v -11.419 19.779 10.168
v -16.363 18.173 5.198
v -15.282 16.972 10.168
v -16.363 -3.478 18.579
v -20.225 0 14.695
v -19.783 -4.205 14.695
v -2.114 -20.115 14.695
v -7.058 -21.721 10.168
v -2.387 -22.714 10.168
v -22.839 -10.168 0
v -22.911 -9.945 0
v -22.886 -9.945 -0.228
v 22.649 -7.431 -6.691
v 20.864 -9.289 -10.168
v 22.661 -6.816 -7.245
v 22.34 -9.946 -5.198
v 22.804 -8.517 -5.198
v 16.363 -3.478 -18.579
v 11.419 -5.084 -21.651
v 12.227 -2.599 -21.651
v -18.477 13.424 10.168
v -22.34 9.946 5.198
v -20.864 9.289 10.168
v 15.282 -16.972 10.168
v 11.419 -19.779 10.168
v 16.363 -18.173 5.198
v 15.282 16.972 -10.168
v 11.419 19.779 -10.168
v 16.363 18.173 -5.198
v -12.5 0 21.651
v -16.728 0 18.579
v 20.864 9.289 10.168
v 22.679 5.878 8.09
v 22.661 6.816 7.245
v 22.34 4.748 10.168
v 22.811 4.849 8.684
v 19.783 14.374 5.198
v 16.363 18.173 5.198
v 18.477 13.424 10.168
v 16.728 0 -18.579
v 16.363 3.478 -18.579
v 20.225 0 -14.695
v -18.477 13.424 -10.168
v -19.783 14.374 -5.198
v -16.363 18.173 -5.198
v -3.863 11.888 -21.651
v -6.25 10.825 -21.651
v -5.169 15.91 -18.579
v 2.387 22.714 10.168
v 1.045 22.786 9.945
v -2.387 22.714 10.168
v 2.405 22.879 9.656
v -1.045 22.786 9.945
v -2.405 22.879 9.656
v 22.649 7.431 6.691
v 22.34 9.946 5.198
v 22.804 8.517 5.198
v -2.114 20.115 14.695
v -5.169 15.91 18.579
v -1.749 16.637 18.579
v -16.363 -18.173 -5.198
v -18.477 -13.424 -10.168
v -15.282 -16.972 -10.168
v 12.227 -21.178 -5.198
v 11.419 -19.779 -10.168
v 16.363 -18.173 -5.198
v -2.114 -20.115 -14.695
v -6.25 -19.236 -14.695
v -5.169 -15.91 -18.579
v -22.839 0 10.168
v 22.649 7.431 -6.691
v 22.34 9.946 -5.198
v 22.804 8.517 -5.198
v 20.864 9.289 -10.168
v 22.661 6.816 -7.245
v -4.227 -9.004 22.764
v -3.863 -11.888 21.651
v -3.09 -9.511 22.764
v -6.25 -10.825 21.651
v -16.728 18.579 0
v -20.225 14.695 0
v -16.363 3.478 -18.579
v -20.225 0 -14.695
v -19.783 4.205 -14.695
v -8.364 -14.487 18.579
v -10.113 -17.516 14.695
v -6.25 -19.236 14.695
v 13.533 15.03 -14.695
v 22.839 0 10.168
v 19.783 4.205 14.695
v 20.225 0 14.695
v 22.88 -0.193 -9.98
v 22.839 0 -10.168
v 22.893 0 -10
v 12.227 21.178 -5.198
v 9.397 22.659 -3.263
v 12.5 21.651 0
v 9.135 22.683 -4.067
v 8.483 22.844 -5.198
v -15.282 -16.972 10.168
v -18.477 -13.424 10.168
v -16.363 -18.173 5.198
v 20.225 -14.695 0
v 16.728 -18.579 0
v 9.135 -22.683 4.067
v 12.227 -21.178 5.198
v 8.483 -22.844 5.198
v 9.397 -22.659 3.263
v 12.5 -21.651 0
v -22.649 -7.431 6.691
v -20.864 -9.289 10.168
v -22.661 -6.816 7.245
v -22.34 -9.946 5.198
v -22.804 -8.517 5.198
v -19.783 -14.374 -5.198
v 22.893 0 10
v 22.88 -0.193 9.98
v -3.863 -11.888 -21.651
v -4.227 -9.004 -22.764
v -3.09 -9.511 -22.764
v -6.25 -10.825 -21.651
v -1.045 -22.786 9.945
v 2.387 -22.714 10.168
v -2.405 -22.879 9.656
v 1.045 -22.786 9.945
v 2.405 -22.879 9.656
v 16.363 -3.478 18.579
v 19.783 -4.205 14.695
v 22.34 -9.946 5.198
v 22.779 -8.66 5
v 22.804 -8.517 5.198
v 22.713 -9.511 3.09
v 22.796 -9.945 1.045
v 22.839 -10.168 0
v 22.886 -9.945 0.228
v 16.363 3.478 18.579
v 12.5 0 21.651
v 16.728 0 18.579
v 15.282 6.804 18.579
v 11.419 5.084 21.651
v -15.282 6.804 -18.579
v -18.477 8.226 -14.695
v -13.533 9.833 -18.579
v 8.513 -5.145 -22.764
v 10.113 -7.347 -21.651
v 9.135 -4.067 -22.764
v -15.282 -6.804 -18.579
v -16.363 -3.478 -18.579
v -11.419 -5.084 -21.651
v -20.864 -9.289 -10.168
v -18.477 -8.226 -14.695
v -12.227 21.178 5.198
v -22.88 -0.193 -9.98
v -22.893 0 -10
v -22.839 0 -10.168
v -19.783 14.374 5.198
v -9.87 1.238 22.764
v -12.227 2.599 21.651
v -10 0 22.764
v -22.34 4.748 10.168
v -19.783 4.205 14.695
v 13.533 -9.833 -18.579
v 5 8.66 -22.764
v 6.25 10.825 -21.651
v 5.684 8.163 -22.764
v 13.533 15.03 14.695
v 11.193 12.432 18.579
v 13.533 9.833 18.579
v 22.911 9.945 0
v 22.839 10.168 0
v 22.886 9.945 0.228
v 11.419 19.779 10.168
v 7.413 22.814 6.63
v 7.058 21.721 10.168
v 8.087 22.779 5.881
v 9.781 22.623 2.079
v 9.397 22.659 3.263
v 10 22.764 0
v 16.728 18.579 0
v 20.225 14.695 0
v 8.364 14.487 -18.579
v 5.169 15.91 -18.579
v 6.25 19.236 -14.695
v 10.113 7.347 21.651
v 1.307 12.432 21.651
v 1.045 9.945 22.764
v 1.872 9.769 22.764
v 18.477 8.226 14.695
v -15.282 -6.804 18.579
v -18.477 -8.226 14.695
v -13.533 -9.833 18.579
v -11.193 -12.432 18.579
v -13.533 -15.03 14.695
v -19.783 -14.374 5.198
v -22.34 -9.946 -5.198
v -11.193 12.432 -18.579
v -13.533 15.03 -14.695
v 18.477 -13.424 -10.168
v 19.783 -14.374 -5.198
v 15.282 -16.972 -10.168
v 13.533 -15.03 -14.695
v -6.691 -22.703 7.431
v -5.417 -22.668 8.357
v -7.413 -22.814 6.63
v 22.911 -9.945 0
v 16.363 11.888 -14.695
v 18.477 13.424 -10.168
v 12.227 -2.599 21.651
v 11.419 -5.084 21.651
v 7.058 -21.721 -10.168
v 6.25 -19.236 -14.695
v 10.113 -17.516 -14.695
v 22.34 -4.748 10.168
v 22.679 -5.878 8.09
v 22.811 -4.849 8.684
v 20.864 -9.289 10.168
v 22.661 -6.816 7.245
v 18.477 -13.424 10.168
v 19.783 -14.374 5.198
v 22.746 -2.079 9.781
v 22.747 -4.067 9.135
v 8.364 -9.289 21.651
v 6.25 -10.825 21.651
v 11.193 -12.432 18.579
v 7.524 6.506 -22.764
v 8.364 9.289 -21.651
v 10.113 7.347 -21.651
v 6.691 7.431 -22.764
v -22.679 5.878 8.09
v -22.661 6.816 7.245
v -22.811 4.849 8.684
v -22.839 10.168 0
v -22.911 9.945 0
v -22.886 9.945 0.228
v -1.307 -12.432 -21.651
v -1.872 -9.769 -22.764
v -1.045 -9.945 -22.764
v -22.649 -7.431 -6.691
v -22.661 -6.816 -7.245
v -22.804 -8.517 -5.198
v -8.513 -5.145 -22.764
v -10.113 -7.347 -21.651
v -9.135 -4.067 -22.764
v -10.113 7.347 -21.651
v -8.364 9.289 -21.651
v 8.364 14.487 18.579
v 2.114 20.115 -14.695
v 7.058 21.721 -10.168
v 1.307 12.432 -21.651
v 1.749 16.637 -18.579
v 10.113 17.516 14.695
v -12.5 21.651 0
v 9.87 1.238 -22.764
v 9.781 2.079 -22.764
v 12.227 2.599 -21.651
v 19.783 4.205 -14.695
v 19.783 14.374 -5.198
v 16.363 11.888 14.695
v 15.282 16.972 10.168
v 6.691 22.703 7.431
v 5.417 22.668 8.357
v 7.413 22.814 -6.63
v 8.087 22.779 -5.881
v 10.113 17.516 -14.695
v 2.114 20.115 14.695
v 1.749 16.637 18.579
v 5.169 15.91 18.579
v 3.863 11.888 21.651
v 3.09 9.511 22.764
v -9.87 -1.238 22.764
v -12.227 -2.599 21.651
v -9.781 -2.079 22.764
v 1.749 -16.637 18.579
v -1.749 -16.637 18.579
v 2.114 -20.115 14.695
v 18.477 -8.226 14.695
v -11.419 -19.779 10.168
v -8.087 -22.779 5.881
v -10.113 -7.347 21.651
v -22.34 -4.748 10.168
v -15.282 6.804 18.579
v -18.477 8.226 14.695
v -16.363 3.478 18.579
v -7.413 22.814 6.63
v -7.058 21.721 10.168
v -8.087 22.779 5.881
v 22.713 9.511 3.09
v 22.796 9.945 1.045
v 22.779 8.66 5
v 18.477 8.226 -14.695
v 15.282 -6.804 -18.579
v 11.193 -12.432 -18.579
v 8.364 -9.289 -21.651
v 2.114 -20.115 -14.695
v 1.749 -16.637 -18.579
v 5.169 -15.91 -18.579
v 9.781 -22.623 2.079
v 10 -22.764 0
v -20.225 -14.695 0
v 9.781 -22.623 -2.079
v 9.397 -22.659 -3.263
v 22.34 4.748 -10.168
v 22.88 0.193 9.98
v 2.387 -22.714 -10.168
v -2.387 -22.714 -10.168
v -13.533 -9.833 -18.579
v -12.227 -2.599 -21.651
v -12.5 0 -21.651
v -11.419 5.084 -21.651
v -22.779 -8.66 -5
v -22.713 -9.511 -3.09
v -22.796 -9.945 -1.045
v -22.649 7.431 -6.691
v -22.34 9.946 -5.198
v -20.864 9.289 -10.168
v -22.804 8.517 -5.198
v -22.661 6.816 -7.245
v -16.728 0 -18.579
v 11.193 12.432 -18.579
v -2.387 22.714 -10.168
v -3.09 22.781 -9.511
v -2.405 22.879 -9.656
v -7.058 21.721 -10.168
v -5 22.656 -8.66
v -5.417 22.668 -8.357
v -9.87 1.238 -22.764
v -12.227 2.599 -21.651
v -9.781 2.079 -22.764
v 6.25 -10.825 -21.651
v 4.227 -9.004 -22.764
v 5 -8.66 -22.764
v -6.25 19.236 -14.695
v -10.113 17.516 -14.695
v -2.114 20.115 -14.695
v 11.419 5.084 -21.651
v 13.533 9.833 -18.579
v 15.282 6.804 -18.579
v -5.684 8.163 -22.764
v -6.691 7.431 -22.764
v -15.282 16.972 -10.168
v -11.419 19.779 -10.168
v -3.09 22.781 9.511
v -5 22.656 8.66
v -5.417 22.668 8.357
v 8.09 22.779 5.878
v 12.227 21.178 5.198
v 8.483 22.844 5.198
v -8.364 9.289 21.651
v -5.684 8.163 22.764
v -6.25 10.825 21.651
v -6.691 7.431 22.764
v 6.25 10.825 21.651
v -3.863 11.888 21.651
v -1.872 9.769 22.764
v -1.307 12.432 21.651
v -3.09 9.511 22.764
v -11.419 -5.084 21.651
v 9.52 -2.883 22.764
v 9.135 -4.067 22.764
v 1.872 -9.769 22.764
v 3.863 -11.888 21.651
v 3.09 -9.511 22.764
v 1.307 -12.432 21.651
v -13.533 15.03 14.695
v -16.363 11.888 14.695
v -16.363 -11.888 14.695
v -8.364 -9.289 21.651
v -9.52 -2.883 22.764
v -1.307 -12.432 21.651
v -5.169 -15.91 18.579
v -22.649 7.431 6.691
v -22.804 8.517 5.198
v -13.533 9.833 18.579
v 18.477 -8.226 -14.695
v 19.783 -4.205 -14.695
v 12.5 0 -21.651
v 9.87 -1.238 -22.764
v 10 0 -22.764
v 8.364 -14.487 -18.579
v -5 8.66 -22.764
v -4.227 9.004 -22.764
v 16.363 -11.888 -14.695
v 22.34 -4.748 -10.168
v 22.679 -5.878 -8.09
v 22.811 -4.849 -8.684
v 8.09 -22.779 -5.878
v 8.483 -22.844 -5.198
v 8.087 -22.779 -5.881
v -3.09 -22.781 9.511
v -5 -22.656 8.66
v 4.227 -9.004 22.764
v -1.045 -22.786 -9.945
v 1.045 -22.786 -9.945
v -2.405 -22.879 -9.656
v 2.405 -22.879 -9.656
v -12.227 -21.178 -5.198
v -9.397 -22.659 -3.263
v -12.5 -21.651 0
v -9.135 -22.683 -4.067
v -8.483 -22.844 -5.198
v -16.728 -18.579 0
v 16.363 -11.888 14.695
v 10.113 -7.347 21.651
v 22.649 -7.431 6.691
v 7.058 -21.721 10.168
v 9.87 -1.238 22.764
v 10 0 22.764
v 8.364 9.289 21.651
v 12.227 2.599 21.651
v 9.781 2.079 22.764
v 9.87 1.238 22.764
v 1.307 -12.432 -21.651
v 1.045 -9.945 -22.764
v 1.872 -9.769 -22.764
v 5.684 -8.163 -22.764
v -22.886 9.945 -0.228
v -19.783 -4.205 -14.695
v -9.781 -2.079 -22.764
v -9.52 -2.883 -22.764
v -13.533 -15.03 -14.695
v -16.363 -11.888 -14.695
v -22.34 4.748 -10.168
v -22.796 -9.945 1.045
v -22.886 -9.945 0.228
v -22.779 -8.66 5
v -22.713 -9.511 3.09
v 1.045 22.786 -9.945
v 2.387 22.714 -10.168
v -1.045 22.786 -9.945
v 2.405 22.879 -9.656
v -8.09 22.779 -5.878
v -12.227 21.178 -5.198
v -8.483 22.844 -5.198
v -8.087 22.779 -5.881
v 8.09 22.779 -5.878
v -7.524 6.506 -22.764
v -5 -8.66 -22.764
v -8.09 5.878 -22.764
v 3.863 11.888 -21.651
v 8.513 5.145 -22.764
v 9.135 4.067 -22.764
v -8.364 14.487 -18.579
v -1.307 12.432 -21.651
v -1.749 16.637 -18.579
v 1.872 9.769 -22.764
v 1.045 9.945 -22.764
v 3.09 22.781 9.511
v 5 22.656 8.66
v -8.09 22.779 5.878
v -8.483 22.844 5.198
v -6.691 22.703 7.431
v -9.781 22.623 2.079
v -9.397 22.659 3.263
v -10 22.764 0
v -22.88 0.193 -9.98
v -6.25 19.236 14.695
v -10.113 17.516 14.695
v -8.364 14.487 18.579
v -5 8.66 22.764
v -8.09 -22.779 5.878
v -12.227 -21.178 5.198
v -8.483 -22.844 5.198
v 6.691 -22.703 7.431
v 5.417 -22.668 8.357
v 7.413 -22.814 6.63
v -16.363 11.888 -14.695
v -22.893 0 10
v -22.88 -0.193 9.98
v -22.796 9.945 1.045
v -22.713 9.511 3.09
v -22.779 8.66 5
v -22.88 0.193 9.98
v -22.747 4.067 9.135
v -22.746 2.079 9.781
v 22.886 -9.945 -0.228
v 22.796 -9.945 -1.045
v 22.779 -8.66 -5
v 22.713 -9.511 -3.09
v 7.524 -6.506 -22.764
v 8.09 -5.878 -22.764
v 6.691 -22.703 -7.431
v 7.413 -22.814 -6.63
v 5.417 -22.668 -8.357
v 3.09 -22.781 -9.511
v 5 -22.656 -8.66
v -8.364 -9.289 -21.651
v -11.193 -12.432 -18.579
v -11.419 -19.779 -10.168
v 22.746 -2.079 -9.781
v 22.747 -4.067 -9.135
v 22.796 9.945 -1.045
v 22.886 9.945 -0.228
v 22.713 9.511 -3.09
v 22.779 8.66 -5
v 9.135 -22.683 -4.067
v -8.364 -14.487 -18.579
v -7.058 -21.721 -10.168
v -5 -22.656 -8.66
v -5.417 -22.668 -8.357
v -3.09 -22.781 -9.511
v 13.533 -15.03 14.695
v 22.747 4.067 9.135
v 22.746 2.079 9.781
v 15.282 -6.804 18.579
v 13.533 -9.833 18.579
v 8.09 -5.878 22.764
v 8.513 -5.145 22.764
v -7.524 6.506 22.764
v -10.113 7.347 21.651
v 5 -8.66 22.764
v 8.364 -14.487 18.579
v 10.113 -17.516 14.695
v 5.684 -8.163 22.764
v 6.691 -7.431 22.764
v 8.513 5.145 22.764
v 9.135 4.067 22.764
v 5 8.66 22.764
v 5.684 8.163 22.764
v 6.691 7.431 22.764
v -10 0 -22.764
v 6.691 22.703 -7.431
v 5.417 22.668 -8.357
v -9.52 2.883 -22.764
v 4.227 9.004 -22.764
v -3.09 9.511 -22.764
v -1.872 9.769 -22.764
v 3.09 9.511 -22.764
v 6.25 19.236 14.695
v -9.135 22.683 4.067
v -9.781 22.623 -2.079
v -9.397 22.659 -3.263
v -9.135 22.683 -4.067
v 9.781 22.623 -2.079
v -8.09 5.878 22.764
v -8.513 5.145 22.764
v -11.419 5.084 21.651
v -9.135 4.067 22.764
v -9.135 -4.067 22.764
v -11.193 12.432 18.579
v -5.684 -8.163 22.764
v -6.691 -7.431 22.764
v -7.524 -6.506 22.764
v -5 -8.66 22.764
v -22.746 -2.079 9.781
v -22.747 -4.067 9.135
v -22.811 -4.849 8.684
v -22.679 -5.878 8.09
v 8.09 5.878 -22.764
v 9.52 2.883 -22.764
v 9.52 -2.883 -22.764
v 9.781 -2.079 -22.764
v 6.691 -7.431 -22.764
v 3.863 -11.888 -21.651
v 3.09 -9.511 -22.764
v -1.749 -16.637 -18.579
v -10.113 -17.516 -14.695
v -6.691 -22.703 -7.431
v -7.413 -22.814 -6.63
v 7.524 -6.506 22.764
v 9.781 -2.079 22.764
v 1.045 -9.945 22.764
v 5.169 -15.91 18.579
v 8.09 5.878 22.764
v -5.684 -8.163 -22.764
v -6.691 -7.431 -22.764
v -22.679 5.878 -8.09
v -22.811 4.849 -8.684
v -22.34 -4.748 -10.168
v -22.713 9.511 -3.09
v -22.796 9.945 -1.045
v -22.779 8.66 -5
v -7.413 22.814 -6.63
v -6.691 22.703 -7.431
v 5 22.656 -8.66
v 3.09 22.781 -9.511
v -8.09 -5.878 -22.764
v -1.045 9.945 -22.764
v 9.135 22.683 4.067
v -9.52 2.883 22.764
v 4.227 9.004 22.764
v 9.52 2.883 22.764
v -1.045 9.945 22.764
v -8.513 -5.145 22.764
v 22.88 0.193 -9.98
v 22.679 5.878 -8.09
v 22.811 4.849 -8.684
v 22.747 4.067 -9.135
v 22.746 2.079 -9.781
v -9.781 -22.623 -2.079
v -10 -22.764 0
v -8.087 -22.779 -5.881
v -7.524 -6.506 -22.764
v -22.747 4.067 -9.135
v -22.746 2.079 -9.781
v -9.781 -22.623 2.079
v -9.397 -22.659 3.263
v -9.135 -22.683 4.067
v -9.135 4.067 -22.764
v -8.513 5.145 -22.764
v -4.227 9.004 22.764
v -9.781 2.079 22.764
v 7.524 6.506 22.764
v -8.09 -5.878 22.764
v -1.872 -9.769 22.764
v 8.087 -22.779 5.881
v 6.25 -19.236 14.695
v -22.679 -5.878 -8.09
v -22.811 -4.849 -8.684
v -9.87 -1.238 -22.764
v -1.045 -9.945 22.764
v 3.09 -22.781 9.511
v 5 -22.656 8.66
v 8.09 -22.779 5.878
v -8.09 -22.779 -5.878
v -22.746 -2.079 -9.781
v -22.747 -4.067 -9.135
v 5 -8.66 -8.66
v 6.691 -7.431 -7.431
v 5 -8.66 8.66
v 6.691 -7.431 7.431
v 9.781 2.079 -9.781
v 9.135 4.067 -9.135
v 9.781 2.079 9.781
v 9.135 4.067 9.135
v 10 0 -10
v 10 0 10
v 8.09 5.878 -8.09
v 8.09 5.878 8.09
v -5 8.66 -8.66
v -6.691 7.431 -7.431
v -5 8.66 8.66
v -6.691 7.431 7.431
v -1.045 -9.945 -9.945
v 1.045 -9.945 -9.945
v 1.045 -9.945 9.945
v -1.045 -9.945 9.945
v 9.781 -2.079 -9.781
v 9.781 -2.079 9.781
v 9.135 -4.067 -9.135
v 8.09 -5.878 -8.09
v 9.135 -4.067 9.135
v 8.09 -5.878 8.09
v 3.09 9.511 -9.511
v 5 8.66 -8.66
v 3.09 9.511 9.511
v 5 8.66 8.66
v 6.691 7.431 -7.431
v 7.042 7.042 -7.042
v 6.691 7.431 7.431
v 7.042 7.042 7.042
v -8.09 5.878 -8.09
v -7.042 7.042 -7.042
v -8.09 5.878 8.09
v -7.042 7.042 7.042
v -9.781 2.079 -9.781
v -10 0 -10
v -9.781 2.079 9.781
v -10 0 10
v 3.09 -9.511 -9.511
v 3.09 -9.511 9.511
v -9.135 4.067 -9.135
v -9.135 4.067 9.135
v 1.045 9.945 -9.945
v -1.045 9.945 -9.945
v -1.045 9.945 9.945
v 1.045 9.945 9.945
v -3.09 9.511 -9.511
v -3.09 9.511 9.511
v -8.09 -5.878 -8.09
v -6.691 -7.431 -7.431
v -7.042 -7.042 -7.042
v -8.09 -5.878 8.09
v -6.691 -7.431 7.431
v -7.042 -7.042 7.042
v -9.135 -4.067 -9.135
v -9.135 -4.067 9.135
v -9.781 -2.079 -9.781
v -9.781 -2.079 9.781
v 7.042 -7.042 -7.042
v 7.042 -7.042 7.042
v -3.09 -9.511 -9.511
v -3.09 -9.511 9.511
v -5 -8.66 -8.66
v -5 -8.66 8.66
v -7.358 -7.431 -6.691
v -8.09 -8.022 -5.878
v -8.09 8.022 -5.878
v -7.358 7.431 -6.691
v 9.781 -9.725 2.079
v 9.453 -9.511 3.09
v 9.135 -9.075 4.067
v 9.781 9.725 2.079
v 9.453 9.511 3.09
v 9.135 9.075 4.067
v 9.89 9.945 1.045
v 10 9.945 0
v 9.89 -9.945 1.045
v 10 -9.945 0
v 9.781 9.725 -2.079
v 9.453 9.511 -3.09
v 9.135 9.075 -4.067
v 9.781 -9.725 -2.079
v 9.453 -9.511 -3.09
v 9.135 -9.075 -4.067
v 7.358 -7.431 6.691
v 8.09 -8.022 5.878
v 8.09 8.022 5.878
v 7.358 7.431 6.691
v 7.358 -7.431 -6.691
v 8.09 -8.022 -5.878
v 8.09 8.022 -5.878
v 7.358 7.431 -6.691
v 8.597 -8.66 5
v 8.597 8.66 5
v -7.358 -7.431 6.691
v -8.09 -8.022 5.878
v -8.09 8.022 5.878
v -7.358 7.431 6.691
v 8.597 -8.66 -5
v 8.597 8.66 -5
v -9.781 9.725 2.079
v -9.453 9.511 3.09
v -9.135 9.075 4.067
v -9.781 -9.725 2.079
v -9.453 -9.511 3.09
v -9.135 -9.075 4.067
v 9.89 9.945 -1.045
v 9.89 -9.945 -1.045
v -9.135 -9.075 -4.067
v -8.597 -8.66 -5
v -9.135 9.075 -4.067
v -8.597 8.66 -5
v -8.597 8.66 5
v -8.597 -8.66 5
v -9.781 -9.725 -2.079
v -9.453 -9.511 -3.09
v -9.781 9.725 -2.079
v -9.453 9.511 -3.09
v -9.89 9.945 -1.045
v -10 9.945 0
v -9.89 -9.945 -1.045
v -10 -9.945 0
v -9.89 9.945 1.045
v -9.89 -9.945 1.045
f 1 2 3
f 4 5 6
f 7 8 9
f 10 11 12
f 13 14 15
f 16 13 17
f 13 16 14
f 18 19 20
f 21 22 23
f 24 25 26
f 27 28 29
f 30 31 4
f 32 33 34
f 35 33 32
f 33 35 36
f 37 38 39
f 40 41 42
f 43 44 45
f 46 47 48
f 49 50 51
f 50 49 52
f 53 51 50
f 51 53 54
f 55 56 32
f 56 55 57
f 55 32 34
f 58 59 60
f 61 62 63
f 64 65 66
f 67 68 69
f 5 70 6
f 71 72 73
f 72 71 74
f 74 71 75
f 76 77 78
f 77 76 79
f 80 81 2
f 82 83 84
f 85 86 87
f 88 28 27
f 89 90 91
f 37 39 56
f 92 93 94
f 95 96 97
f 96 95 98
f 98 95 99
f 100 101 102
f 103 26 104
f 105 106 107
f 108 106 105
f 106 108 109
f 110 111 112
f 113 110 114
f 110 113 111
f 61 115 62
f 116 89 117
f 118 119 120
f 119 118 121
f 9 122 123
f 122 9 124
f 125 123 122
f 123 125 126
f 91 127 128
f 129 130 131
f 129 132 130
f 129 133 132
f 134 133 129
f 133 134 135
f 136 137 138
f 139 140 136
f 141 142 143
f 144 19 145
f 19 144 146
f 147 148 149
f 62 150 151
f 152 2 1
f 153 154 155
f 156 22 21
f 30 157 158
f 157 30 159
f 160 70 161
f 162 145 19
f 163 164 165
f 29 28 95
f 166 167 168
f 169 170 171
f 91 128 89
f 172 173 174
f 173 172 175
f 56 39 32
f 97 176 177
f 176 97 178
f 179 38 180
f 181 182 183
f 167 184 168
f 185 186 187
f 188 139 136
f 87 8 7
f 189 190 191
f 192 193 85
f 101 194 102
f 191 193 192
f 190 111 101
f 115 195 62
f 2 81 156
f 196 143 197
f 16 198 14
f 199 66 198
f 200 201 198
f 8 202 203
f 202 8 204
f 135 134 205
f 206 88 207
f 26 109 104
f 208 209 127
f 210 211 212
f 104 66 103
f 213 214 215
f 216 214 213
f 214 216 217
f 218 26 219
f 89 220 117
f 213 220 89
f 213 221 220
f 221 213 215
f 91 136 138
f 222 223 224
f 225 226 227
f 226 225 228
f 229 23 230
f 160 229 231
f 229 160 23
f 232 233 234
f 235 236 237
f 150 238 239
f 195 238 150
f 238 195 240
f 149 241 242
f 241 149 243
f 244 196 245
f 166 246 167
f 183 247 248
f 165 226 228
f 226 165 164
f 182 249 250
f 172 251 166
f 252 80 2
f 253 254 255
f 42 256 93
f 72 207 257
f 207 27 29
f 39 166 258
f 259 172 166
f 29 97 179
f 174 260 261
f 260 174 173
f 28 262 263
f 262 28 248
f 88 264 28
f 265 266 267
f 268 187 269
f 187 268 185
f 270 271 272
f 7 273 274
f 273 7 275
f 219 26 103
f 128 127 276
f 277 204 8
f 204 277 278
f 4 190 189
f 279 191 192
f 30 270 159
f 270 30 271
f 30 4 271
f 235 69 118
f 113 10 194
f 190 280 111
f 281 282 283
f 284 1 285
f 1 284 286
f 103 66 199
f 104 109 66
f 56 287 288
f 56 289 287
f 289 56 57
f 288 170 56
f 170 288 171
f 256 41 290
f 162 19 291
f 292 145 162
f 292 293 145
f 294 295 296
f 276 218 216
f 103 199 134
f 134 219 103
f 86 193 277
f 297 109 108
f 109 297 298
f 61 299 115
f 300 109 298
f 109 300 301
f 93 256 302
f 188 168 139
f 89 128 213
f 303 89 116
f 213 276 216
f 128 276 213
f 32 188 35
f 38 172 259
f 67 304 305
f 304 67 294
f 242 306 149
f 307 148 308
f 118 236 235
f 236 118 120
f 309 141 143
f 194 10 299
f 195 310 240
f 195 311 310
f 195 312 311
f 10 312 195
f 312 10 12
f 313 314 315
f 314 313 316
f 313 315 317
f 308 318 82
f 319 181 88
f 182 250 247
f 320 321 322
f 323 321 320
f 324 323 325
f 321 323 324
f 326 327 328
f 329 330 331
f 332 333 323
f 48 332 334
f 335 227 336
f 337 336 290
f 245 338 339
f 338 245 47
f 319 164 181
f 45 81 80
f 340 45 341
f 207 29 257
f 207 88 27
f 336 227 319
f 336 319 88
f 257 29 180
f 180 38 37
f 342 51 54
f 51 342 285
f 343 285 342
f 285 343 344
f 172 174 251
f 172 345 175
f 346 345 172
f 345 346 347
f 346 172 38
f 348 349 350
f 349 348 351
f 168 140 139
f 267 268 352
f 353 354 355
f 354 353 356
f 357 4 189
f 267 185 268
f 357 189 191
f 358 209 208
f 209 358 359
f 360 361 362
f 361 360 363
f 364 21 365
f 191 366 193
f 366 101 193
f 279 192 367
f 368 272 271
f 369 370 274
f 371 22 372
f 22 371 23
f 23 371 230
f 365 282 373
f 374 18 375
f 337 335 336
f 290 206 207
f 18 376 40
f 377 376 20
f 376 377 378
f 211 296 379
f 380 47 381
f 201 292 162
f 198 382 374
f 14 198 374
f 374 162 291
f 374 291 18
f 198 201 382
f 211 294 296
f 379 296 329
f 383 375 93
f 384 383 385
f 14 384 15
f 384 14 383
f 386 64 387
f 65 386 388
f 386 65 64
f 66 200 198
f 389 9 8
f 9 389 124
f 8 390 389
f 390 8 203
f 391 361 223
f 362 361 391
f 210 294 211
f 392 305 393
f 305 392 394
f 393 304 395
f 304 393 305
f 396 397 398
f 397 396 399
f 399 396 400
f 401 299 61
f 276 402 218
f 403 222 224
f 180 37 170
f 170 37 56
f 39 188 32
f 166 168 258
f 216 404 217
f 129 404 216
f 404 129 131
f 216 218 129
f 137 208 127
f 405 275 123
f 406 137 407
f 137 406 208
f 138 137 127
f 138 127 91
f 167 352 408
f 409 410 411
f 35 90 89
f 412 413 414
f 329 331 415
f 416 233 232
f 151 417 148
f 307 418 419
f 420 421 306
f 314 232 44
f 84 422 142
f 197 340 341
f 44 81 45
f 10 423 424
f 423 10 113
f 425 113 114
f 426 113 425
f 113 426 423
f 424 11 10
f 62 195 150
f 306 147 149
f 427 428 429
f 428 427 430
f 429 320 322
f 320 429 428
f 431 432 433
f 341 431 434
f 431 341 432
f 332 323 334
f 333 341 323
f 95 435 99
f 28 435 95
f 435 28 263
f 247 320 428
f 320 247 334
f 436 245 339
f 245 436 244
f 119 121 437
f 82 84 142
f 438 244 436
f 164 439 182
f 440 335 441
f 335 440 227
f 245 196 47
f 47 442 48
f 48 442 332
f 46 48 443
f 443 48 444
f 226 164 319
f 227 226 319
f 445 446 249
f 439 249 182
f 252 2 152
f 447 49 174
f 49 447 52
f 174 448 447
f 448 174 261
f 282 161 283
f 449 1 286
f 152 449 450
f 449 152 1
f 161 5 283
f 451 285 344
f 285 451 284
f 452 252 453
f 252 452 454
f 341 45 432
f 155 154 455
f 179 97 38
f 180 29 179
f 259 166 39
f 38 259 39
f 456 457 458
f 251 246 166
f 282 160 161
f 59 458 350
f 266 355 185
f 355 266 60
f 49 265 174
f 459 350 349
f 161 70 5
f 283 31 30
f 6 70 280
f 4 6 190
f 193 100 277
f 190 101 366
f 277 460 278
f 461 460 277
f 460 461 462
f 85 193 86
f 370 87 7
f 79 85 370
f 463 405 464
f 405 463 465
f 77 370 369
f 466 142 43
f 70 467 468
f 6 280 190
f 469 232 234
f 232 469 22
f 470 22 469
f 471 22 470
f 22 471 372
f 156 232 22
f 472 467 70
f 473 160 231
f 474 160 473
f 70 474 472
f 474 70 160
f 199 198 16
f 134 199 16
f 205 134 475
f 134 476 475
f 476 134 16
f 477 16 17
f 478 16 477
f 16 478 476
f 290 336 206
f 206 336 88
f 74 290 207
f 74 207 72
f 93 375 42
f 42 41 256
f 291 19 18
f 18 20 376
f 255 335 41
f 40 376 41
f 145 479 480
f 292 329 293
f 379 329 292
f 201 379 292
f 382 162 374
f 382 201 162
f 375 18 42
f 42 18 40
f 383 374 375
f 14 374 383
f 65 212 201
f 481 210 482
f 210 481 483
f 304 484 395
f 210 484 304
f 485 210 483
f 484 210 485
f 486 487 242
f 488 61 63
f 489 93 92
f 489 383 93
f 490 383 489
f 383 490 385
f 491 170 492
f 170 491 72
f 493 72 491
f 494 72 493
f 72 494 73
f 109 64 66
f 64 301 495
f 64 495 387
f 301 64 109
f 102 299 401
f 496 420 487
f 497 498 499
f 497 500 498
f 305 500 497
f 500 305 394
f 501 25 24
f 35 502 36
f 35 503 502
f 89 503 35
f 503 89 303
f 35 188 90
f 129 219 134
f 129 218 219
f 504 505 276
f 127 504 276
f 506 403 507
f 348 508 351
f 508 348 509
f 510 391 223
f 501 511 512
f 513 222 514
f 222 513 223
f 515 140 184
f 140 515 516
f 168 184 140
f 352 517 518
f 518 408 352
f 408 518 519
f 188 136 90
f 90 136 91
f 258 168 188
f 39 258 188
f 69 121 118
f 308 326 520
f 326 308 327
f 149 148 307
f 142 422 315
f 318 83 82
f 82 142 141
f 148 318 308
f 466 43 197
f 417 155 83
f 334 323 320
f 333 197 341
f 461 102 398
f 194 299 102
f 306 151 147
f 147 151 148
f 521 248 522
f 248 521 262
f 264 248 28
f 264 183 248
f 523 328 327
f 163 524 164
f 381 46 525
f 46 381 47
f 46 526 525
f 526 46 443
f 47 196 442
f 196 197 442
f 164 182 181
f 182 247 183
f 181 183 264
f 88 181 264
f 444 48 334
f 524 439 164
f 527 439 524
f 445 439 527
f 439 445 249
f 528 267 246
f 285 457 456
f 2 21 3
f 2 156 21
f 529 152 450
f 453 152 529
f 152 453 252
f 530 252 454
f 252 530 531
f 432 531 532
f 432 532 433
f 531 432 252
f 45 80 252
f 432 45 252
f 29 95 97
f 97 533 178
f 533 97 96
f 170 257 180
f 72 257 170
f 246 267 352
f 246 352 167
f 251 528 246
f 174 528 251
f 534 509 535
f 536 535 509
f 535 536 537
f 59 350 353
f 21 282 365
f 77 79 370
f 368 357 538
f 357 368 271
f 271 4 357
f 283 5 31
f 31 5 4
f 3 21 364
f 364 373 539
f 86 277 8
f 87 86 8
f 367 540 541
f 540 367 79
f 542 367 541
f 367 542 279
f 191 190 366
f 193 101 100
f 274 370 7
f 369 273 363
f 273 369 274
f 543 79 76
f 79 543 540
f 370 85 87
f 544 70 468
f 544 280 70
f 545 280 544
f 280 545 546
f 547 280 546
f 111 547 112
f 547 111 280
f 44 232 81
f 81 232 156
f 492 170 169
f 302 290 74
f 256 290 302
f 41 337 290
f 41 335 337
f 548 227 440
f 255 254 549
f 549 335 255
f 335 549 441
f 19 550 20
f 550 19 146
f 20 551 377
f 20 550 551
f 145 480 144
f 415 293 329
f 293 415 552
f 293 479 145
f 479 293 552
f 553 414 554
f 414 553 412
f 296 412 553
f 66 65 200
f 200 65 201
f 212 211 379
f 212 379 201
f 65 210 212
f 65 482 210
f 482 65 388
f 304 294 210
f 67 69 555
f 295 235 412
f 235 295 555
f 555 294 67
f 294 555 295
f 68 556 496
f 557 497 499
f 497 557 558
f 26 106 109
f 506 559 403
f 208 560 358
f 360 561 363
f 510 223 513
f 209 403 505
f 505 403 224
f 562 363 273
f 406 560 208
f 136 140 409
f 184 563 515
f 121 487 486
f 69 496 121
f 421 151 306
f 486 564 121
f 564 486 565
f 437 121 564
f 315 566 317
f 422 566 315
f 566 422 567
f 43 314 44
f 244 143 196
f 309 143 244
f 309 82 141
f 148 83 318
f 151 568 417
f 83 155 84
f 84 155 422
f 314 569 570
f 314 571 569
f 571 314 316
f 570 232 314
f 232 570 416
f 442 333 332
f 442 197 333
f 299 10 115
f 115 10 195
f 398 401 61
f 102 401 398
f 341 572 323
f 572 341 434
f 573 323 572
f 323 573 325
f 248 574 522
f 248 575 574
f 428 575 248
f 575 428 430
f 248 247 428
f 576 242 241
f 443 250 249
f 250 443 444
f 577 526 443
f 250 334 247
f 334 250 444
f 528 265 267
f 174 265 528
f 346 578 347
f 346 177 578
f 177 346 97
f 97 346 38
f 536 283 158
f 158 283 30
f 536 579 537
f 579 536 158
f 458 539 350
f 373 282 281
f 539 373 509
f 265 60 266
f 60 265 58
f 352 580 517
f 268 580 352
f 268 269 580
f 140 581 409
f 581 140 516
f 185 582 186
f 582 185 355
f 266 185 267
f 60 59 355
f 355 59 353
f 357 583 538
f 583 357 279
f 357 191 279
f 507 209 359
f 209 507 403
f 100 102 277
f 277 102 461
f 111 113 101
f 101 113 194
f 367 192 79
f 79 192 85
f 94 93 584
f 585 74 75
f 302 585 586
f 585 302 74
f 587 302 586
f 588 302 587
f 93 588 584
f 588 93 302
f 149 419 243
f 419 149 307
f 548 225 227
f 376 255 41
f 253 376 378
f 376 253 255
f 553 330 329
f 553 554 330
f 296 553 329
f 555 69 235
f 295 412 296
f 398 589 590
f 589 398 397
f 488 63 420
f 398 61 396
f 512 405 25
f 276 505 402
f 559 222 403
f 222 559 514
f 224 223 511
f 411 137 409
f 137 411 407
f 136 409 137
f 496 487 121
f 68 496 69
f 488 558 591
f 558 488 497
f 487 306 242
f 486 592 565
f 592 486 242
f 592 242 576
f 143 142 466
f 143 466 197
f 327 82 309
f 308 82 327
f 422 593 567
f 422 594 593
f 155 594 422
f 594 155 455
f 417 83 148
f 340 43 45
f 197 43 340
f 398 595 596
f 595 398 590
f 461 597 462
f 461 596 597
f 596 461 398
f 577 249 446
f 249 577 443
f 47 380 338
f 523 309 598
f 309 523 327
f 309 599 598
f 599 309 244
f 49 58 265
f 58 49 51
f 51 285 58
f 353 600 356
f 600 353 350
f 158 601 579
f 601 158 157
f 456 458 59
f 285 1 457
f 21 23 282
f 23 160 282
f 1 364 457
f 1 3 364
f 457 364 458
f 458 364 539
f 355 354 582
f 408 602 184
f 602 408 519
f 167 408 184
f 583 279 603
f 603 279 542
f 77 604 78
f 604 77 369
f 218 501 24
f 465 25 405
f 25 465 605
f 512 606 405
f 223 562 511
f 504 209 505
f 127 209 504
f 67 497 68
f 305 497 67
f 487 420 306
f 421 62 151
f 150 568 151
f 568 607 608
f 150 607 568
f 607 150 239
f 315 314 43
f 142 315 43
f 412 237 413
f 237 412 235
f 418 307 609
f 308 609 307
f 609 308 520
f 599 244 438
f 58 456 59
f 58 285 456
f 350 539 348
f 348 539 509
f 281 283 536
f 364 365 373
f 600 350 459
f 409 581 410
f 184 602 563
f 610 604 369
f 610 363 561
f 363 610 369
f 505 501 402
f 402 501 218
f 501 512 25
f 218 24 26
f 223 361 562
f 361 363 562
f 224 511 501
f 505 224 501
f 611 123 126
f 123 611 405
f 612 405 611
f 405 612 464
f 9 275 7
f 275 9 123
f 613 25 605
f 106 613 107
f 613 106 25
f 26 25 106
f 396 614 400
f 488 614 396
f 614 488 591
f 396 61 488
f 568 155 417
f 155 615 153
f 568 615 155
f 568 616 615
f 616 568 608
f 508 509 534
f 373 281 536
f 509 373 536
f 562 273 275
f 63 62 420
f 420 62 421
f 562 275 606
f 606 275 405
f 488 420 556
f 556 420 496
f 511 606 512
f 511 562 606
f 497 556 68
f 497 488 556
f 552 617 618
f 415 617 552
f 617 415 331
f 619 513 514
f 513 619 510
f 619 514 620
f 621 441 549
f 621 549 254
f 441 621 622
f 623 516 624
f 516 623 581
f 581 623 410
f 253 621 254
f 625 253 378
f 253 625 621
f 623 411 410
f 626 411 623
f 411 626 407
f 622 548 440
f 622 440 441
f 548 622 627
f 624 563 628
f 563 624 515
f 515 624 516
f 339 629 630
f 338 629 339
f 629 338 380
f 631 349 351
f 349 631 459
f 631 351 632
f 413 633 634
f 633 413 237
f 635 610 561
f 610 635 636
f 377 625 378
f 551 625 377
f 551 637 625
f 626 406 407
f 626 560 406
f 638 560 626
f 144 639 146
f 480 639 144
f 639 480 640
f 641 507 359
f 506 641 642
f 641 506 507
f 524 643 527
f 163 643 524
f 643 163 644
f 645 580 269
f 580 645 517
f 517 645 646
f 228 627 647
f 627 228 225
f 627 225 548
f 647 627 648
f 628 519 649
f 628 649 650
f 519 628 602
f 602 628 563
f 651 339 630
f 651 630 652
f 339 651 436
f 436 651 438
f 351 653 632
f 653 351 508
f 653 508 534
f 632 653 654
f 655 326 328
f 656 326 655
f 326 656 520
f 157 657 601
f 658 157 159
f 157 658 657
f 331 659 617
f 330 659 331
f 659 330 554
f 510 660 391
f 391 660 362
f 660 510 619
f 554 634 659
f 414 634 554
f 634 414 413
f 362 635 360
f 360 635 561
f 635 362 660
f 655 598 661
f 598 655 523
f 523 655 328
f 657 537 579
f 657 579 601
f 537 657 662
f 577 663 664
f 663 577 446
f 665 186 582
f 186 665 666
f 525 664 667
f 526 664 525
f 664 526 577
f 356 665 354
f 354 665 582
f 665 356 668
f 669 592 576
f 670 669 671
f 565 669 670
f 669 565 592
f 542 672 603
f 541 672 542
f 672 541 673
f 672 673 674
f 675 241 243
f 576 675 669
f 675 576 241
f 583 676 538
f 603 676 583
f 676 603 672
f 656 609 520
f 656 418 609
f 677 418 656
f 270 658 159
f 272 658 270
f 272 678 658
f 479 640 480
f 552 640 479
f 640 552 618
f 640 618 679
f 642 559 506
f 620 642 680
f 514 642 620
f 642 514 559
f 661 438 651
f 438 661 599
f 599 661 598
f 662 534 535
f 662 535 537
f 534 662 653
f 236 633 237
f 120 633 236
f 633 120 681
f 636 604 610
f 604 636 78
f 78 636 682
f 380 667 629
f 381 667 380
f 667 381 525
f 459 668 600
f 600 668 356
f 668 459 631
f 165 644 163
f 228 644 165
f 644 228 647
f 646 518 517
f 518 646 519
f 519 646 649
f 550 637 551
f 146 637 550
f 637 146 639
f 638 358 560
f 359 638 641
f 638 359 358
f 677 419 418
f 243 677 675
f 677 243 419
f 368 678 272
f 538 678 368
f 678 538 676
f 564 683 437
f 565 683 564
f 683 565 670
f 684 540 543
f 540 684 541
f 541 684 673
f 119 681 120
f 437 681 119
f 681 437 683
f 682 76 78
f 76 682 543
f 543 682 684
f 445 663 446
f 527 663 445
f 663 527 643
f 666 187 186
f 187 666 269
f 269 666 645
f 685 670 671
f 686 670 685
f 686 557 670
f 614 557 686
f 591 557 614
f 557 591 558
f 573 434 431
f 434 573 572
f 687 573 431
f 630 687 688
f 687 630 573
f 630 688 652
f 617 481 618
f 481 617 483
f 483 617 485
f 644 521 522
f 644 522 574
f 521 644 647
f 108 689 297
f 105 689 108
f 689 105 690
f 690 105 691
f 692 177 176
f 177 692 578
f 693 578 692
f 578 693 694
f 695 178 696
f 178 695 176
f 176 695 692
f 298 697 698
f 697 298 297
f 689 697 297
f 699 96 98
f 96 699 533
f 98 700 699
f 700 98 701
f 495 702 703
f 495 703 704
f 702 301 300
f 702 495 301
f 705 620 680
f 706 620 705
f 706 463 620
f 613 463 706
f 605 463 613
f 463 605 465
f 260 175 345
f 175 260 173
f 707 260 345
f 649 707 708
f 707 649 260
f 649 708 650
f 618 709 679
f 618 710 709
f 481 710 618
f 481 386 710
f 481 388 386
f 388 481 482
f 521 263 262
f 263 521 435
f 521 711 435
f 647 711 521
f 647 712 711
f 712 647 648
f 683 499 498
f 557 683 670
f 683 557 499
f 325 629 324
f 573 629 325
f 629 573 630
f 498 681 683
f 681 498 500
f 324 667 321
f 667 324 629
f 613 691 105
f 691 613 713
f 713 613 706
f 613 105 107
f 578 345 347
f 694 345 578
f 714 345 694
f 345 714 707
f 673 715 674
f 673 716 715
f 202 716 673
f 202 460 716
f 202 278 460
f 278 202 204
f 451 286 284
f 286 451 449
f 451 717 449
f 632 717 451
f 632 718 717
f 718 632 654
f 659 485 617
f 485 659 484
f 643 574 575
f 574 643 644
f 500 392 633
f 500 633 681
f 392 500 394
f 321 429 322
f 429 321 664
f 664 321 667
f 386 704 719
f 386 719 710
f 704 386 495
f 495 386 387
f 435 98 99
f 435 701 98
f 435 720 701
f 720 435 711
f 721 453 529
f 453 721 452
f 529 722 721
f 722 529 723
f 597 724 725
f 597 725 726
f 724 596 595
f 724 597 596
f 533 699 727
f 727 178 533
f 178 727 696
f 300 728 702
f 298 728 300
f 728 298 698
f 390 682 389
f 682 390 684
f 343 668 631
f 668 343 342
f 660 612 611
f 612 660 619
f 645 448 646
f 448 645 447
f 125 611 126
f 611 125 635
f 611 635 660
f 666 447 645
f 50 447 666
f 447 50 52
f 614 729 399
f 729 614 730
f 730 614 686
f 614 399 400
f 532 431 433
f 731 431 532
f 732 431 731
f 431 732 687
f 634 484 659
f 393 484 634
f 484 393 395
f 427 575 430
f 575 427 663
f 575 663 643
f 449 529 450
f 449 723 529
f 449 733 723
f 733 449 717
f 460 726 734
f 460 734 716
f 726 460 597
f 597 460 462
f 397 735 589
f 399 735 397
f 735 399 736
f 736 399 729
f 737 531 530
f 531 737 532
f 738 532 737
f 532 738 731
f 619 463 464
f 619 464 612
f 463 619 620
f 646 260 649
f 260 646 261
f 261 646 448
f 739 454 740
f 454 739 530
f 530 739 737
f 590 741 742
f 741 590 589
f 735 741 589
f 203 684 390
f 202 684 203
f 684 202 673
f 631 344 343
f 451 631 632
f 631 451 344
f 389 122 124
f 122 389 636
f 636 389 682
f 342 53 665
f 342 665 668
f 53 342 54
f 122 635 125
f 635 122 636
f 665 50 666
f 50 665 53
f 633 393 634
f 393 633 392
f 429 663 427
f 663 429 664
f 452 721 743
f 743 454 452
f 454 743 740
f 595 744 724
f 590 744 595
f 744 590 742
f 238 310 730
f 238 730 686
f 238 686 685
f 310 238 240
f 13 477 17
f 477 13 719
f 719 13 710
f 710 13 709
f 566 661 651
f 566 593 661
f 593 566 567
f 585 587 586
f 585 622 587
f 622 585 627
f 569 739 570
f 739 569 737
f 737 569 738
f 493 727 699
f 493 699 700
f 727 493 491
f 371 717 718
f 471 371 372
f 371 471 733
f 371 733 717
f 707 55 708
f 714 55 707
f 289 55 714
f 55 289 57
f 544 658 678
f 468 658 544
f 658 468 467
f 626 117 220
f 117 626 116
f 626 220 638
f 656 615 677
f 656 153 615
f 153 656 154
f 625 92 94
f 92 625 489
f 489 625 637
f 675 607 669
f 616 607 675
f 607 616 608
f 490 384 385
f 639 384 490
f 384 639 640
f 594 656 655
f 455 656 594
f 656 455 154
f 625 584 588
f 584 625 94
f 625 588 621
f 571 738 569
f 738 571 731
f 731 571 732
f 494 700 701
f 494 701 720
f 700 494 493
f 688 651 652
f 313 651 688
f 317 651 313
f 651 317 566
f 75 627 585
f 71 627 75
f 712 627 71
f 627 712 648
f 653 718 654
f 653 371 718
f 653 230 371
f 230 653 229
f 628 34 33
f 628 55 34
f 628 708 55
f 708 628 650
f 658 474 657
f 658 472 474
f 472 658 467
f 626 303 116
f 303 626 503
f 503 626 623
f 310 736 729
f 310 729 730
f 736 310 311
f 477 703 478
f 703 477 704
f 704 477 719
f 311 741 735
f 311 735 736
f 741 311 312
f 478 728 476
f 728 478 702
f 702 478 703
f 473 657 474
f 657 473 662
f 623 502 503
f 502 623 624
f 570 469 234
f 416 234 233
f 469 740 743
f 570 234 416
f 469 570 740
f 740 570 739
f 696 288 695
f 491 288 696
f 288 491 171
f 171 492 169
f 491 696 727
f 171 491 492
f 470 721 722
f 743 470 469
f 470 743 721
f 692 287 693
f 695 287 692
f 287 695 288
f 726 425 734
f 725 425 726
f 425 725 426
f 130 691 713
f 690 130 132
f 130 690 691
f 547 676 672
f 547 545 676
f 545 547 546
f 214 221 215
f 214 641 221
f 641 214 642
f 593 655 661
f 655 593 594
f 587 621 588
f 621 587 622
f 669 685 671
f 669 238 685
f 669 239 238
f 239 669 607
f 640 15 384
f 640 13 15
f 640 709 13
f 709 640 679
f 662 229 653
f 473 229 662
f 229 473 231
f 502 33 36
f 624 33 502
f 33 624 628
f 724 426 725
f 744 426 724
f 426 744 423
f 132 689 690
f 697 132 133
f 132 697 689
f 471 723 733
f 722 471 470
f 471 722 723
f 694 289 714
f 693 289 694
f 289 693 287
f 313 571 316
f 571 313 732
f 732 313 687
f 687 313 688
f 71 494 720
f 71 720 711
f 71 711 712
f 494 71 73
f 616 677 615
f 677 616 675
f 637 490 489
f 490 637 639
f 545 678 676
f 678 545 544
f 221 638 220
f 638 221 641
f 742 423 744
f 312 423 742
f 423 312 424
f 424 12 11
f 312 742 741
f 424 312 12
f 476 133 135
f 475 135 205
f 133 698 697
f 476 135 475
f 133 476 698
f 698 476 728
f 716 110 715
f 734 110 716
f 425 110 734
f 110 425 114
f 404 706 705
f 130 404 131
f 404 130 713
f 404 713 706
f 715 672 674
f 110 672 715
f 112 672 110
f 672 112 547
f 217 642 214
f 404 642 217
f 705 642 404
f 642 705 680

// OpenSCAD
module example001()
{
	function r_from_dia(d) = d / 2;

	module rotcy(rot, r, h) {
		rotate(90, rot)
			cylinder(r = r, h = h, center = true);
	}

	size = 50;
	hole = 20;

	cy_r = r_from_dia(hole);
	cy_h = r_from_dia(size * 2.5);

	difference() {
		sphere(r = r_from_dia(size));
		rotcy([0, 0, 0], cy_r, cy_h);
		rotcy([1, 0, 0], cy_r, cy_h);
		rotcy([0, 1, 0], cy_r, cy_h);
	}


}

example001();
